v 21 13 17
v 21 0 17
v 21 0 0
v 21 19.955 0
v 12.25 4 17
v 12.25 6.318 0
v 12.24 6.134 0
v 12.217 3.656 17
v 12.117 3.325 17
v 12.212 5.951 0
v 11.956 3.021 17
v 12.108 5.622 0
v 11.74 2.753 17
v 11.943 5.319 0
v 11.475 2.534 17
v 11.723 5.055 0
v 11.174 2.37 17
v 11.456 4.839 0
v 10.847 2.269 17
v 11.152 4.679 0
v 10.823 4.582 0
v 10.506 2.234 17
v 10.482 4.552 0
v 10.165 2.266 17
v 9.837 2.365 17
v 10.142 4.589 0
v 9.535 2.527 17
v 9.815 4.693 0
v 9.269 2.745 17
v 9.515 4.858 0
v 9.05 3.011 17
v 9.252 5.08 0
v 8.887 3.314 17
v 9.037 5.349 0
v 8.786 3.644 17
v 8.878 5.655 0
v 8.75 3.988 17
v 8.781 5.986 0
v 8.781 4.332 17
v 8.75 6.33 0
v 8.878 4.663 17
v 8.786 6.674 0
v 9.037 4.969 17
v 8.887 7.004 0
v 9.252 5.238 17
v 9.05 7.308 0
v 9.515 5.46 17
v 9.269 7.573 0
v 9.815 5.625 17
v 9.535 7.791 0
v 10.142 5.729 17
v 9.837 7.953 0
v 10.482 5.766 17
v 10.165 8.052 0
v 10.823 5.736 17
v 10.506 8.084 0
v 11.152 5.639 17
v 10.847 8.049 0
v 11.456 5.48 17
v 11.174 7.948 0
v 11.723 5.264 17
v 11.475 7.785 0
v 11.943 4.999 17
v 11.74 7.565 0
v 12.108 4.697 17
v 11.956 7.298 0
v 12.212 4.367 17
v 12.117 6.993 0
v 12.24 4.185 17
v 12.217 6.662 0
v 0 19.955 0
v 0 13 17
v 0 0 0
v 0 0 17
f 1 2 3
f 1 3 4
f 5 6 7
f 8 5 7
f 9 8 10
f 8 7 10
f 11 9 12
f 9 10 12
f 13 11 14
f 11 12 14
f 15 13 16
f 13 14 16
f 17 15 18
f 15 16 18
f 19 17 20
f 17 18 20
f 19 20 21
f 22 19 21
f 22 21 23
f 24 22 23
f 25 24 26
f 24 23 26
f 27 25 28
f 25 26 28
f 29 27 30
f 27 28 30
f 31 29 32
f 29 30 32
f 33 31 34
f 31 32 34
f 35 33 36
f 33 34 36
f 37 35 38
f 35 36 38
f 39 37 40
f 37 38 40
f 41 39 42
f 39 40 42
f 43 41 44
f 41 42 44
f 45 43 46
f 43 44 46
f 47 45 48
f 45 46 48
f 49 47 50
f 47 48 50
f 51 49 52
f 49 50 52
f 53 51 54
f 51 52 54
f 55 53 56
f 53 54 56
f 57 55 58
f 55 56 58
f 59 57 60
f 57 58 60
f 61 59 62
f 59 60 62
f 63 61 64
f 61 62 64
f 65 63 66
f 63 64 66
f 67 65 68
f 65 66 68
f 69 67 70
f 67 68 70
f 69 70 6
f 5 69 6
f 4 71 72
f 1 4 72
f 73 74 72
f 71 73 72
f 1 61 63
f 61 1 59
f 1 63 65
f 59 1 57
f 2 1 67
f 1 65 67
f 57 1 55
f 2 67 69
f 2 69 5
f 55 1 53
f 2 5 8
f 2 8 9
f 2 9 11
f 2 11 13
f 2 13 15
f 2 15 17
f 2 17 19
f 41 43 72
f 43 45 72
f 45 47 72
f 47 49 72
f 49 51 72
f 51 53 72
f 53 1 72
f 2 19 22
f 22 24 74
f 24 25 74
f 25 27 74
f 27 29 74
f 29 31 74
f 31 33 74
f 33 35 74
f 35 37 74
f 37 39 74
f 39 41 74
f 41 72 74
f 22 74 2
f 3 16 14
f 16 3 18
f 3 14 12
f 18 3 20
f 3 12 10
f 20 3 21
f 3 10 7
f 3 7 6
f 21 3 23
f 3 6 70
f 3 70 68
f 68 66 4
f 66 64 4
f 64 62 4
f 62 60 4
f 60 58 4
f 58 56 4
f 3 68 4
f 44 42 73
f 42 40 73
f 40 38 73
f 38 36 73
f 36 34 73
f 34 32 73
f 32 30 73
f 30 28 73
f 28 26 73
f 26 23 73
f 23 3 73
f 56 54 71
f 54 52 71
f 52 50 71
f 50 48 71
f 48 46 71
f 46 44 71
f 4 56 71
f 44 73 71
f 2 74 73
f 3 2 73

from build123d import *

# Parameters (mm, degrees)
F1_DEPTH      = 21
F6_DEPTH      = 11.6432544745
F6_DEPTH_BACK = 13.1294997266
F7_W          = 22
F7_H          = 5
F8_DEPTH      = 21.001


with BuildPart() as f1:
    # F0 (on Right) → F1 (new body)
    with BuildSketch(Plane.YZ):
        Polygon((0, 22), (0, 0), (22, 0), (13, 22), align=None)
    extrude(amount=F1_DEPTH)

    # F5 (on line) → F6 (cut, two sides)
    with BuildSketch(Plane(origin=(0, -1.3722109533, 10.0628803245), x_dir=(1, 0, 0), z_dir=(0, 0.1351132047, -0.990830168))) as f6_sk:
        with BuildLine():
            ThreePointArc((8.75, -6.9358111763), (10.5, -8.6858111763), (12.25, -6.9358111763))
            ThreePointArc((12.25, -6.9358111763), (10.5, -5.1858111763), (8.75, -6.9358111763))
        make_face()
    extrude(amount=-F6_DEPTH, mode=Mode.SUBTRACT)
    extrude(f6_sk.sketch, amount=F6_DEPTH_BACK, mode=Mode.SUBTRACT)

    # F7 (on Right) → F8 (cut, through all)
    with BuildSketch(Plane.YZ):
        with Locations((11, 2.5)):
            Rectangle(F7_W, F7_H)
    extrude(amount=F8_DEPTH, mode=Mode.SUBTRACT)


with BuildPart() as f1_1:
    # F9: moved
    add(f1.part.moved(Location((0, 0, -5))))


solid = f1_1.part
